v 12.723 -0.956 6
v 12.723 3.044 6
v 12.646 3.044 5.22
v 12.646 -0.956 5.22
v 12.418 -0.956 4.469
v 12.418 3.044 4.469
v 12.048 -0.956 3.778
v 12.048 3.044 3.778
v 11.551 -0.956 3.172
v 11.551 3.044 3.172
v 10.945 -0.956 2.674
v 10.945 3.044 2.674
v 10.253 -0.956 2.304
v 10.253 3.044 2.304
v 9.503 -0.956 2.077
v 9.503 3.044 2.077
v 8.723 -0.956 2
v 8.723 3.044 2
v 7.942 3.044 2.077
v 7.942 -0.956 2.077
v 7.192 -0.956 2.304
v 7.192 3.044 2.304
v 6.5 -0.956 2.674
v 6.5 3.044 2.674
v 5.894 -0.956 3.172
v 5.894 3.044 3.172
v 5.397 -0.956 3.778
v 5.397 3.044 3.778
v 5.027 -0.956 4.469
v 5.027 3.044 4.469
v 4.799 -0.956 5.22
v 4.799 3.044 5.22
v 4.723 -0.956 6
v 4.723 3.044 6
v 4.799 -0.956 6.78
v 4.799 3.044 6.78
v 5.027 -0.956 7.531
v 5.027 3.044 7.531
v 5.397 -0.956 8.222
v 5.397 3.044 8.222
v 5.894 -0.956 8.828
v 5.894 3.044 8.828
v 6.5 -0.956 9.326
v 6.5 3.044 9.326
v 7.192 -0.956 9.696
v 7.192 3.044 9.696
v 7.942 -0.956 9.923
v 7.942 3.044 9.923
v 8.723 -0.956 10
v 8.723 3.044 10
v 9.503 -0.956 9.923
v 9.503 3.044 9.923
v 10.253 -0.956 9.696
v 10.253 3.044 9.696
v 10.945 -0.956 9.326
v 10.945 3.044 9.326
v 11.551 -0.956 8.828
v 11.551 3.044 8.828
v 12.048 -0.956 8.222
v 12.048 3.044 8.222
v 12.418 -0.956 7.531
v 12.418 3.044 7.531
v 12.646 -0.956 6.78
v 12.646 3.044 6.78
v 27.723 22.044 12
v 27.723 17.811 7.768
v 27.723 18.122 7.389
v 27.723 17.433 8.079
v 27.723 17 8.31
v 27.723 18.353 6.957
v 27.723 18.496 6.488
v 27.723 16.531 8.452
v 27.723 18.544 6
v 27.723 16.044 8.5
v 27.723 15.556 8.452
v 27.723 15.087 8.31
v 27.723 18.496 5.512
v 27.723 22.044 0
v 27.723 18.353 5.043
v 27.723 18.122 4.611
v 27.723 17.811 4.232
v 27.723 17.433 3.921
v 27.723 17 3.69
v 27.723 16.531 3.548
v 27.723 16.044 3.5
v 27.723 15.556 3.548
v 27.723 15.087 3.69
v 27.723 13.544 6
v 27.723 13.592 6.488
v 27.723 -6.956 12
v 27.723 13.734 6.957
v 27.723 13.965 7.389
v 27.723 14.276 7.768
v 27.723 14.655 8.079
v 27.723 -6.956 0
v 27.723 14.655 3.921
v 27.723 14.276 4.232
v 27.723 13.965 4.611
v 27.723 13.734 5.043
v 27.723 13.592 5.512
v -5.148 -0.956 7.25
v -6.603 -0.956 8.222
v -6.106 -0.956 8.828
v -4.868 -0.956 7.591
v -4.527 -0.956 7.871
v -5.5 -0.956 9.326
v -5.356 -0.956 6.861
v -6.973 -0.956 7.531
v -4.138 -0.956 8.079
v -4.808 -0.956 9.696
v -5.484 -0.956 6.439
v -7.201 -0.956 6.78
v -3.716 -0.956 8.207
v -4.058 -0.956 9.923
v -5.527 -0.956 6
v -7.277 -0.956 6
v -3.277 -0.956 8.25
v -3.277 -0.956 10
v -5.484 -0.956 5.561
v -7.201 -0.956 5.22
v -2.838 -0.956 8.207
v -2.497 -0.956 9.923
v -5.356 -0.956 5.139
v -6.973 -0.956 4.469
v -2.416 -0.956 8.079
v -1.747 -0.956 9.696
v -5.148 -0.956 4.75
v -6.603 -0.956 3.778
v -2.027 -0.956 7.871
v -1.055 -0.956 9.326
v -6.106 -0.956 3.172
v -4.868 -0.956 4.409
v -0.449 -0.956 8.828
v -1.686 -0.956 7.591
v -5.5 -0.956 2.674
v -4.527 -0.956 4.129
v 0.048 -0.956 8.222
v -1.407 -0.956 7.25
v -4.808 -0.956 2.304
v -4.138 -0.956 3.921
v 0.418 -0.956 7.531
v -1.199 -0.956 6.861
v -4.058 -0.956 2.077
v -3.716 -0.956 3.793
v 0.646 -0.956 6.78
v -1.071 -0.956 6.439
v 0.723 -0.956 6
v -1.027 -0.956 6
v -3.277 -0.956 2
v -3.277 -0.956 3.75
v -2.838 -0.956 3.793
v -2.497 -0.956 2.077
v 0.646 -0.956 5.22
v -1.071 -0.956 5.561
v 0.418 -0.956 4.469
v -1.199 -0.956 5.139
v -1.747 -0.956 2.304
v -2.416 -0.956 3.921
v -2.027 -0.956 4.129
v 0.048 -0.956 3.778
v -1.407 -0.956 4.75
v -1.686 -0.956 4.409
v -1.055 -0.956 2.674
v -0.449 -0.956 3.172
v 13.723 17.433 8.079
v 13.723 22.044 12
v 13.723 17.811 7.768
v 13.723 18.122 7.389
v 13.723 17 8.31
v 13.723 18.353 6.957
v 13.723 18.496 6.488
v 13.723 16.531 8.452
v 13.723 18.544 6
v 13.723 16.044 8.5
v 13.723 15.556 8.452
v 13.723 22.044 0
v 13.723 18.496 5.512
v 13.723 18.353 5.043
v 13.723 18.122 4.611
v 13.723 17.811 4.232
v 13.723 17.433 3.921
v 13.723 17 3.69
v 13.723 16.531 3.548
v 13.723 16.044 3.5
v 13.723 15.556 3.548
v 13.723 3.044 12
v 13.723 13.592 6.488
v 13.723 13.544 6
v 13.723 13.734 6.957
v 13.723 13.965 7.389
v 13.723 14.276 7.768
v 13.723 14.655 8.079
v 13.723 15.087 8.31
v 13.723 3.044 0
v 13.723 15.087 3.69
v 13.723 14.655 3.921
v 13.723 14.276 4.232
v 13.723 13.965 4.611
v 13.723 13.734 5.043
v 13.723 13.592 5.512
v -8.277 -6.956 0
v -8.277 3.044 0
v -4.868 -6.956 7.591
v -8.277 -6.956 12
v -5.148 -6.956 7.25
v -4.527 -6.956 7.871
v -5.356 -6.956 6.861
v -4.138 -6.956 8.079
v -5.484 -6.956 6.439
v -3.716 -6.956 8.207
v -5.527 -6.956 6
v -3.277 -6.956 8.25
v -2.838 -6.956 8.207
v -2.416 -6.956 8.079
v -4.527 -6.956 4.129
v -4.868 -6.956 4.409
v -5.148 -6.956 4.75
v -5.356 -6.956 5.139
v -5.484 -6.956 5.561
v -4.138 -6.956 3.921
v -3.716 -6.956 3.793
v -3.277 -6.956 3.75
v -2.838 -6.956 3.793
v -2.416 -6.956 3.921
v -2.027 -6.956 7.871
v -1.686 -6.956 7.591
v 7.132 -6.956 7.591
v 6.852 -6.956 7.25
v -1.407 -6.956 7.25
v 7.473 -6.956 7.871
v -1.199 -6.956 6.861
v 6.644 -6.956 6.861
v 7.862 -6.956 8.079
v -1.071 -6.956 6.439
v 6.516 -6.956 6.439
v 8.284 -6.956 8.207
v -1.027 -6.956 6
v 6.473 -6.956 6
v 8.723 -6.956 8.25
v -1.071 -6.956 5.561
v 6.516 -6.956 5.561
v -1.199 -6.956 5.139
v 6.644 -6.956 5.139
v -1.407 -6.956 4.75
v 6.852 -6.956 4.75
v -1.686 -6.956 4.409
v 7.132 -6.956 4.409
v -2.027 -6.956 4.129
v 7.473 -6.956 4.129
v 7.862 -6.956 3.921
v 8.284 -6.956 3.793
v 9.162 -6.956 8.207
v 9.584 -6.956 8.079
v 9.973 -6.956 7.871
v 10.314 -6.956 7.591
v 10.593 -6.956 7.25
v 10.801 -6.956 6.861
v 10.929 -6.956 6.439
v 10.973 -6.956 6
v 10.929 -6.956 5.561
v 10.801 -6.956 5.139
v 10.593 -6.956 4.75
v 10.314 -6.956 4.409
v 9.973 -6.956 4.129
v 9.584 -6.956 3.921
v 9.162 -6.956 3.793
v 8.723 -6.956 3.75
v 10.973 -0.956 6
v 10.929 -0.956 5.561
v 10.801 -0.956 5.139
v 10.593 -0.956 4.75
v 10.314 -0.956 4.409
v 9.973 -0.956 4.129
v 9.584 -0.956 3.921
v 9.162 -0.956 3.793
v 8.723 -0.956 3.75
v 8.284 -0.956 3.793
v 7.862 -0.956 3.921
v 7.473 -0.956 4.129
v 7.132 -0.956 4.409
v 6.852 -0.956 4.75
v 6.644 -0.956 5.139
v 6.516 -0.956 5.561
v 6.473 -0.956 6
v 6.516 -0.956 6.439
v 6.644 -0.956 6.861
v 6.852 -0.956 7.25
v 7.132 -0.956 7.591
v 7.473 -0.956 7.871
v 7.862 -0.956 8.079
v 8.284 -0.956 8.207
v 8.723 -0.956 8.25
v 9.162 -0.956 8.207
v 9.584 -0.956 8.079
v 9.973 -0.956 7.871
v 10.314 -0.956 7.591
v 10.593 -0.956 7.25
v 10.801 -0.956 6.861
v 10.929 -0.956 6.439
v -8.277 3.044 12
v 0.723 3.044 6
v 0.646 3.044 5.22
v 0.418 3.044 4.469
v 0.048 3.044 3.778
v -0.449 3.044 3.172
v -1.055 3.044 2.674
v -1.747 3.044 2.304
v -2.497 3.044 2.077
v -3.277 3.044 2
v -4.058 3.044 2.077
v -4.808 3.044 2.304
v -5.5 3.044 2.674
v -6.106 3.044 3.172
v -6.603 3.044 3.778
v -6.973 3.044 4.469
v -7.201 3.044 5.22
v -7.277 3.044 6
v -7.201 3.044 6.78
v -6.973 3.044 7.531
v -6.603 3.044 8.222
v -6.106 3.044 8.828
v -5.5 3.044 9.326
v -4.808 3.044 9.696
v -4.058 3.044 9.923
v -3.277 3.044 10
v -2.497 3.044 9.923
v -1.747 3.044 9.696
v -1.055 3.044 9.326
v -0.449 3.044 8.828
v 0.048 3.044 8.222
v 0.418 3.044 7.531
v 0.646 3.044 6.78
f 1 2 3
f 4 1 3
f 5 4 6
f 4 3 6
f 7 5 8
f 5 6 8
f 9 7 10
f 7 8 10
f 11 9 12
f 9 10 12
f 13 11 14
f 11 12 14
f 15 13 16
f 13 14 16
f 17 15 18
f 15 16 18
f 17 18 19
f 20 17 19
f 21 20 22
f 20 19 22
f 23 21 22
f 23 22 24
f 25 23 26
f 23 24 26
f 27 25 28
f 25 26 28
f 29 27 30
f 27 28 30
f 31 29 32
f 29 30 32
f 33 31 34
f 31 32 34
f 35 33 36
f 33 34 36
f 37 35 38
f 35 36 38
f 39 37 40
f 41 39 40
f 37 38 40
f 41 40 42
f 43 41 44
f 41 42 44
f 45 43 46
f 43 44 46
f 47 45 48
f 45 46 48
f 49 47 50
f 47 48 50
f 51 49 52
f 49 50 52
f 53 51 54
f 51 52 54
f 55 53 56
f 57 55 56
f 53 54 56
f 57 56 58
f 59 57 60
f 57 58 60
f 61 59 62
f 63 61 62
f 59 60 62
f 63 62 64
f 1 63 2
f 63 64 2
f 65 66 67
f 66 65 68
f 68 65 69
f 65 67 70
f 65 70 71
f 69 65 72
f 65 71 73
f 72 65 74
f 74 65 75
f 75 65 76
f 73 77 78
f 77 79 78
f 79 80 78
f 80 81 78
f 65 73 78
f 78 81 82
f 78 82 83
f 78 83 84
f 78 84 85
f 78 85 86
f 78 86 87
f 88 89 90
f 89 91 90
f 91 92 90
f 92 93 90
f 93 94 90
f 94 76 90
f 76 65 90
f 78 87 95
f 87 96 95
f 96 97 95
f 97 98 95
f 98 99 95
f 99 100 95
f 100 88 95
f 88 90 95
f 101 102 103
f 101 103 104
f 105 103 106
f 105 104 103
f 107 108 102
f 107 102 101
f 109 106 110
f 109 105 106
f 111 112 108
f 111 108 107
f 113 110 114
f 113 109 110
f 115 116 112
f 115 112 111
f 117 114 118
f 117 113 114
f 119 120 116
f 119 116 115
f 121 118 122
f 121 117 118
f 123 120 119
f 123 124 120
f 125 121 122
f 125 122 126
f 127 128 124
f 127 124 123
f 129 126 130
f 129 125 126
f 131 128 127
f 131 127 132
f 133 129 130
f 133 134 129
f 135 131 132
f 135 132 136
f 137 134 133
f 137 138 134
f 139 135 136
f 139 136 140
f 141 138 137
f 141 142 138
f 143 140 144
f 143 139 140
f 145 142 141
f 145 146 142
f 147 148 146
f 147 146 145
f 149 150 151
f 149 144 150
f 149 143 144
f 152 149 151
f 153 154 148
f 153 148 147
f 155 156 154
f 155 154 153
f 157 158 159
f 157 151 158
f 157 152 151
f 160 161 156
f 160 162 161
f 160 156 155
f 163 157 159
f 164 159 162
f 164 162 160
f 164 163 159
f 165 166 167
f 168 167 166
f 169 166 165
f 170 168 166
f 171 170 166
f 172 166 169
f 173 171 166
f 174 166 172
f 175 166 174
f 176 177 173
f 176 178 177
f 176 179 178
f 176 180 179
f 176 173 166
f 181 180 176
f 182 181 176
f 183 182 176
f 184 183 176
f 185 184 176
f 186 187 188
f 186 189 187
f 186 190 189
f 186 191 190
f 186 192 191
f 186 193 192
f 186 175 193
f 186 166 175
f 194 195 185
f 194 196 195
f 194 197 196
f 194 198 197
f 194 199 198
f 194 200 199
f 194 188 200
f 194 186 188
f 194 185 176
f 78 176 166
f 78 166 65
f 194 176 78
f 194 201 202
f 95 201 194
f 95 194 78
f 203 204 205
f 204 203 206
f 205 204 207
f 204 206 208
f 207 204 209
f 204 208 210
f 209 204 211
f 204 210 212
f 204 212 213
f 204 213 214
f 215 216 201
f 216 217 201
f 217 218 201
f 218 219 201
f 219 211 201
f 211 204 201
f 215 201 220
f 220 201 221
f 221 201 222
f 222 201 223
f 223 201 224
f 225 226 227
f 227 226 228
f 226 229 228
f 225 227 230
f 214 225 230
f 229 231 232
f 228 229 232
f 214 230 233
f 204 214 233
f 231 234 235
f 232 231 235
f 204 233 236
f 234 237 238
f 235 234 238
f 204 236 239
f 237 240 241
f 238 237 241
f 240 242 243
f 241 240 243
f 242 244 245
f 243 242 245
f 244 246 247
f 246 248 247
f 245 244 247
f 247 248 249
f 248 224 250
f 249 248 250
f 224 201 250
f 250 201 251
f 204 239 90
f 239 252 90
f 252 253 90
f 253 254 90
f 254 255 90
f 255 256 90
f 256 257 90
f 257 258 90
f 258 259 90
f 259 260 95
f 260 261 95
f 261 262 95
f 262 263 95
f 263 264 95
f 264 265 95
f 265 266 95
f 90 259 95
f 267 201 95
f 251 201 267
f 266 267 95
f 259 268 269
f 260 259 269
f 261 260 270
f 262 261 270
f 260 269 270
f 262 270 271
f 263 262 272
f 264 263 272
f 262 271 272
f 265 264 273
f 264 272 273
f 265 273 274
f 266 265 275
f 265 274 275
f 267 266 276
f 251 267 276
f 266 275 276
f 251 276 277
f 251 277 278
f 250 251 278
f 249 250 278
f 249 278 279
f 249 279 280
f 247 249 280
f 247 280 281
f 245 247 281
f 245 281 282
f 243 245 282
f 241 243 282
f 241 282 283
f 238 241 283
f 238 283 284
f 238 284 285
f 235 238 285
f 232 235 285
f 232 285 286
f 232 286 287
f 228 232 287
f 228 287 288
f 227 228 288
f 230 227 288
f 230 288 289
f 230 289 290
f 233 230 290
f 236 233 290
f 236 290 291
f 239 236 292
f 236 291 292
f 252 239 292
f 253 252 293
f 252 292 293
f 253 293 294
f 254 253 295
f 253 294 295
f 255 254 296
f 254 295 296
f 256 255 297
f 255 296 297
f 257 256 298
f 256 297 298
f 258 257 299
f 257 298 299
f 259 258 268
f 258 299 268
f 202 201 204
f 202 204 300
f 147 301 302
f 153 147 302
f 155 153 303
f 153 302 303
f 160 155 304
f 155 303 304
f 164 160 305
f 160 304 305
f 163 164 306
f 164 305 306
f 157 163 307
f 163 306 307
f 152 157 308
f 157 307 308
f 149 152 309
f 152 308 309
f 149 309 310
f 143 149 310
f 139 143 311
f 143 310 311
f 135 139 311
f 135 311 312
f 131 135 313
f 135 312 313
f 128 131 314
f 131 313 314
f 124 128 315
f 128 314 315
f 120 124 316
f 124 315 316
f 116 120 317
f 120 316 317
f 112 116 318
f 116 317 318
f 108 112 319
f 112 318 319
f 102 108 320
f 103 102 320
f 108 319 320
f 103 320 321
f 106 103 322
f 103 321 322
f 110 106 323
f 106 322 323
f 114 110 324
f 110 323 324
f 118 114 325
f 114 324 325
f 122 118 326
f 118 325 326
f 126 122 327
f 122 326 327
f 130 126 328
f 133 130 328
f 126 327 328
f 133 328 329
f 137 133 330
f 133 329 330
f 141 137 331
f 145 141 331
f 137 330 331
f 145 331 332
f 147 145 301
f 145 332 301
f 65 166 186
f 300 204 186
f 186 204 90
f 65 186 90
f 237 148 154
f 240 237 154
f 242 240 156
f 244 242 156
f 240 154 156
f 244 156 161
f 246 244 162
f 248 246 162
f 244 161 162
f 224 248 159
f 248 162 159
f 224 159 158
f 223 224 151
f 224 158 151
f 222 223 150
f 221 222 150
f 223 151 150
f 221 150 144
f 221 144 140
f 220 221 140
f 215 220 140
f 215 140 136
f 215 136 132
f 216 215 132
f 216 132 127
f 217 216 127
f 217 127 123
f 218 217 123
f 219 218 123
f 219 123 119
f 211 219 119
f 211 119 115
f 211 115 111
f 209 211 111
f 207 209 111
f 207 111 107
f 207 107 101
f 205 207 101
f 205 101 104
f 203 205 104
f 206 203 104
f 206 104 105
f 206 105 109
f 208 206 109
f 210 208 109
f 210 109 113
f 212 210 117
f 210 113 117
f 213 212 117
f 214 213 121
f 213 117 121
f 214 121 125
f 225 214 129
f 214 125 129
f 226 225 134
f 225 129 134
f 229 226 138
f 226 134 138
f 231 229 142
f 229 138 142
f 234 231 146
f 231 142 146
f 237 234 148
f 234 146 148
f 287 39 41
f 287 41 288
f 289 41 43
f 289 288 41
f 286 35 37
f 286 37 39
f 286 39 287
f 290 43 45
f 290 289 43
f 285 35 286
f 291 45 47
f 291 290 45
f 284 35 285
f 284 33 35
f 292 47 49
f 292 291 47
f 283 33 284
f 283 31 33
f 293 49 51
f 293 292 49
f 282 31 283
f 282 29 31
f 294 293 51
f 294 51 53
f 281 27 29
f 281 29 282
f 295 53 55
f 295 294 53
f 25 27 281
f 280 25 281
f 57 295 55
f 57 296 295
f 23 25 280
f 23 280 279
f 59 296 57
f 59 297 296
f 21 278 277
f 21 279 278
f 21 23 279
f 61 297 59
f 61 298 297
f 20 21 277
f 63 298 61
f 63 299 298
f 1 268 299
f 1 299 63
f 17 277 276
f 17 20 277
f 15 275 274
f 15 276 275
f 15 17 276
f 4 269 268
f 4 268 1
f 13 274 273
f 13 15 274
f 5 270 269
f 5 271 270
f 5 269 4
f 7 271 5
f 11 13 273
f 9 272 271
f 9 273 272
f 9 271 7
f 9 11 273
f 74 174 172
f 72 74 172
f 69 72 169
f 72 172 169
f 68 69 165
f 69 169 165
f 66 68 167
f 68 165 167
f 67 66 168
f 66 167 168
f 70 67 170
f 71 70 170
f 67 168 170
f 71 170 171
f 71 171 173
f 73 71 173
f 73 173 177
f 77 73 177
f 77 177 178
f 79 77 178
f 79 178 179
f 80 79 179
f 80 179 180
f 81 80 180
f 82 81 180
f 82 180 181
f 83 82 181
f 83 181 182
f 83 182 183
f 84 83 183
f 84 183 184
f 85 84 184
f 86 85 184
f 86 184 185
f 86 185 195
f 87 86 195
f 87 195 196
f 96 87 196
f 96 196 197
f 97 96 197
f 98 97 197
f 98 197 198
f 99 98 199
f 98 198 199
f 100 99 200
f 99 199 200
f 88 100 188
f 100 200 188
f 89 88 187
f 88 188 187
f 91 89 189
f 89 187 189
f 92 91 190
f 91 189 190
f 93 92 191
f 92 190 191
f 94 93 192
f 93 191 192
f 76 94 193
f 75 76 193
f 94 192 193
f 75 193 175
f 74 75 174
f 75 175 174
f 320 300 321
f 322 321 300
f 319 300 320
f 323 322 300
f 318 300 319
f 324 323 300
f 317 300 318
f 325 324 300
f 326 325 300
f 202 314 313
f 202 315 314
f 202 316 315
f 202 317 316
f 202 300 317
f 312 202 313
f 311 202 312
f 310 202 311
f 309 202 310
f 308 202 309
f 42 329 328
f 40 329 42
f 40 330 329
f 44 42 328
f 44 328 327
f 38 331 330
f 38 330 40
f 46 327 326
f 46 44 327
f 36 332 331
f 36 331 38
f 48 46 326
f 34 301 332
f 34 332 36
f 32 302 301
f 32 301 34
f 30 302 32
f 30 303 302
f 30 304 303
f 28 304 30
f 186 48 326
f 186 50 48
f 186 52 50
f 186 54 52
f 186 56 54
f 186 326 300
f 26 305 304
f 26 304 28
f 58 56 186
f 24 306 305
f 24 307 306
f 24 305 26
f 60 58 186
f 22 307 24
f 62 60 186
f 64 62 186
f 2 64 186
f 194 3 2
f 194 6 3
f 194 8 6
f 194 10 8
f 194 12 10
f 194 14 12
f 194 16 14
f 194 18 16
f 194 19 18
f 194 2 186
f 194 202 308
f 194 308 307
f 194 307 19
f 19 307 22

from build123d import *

# Parameters (mm, degrees)
SKETCH1_W           = 36
SKETCH1_H           = 10
BOSS_EXTRUDE1_DEPTH = 12
SKETCH2_W           = 14
SKETCH2_H           = 12
BOSS_EXTRUDE2_DEPTH = 19
SKETCH3_R           = 2.25
CUT_EXTRUDE1_DEPTH  = 11
SKETCH4_R           = 4
CUT_EXTRUDE2_DEPTH  = 4
M6_TAPPED_HOLE1_D   = 5


with BuildPart() as part:
    # Sketch1 → Boss-Extrude1 (new body)
    with BuildSketch(Plane.XY):
        with Locations((9.722605043, -1.956268222)):
            Rectangle(SKETCH1_W, SKETCH1_H)
    extrude(amount=BOSS_EXTRUDE1_DEPTH)

    # Sketch2 → Boss-Extrude2 (add)
    with BuildSketch(Plane(origin=(0, 3.043731778, 0), x_dir=(1, 0, 0), z_dir=(0, 1, 0))):
        with Locations((20.722605043, -6)):
            Rectangle(SKETCH2_W, SKETCH2_H)
    extrude(amount=BOSS_EXTRUDE2_DEPTH)

    # Sketch3 → Cut-Extrude1 (cut, through all)
    with BuildSketch(Plane(origin=(0, 3.043731778, 0), x_dir=(1, 0, 0), z_dir=(0, 1, 0))):
        with Locations((-3.277394957, -6)):
            Circle(SKETCH3_R)
        with Locations((8.722605043, -6)):
            Circle(SKETCH3_R)
    extrude(amount=-CUT_EXTRUDE1_DEPTH, mode=Mode.SUBTRACT)

    # Sketch4 → Cut-Extrude2 (cut)
    with BuildSketch(Plane(origin=(0, 3.043731778, 0), x_dir=(1, 0, 0), z_dir=(0, 1, 0))):
        with Locations((-3.277394957, -6)):
            Circle(SKETCH4_R)
        with Locations((8.722605043, -6)):
            Circle(SKETCH4_R)
    extrude(amount=-CUT_EXTRUDE2_DEPTH, mode=Mode.SUBTRACT)

    # M6 Tapped Hole1 (through all)
    with Locations(Plane(origin=(27.722605043, 0, 0), x_dir=(0, 0, -1), z_dir=(1, 0, 0))):
        with Locations((-6, 16.043731778)):
            Hole(M6_TAPPED_HOLE1_D / 2)


solid = part.part
